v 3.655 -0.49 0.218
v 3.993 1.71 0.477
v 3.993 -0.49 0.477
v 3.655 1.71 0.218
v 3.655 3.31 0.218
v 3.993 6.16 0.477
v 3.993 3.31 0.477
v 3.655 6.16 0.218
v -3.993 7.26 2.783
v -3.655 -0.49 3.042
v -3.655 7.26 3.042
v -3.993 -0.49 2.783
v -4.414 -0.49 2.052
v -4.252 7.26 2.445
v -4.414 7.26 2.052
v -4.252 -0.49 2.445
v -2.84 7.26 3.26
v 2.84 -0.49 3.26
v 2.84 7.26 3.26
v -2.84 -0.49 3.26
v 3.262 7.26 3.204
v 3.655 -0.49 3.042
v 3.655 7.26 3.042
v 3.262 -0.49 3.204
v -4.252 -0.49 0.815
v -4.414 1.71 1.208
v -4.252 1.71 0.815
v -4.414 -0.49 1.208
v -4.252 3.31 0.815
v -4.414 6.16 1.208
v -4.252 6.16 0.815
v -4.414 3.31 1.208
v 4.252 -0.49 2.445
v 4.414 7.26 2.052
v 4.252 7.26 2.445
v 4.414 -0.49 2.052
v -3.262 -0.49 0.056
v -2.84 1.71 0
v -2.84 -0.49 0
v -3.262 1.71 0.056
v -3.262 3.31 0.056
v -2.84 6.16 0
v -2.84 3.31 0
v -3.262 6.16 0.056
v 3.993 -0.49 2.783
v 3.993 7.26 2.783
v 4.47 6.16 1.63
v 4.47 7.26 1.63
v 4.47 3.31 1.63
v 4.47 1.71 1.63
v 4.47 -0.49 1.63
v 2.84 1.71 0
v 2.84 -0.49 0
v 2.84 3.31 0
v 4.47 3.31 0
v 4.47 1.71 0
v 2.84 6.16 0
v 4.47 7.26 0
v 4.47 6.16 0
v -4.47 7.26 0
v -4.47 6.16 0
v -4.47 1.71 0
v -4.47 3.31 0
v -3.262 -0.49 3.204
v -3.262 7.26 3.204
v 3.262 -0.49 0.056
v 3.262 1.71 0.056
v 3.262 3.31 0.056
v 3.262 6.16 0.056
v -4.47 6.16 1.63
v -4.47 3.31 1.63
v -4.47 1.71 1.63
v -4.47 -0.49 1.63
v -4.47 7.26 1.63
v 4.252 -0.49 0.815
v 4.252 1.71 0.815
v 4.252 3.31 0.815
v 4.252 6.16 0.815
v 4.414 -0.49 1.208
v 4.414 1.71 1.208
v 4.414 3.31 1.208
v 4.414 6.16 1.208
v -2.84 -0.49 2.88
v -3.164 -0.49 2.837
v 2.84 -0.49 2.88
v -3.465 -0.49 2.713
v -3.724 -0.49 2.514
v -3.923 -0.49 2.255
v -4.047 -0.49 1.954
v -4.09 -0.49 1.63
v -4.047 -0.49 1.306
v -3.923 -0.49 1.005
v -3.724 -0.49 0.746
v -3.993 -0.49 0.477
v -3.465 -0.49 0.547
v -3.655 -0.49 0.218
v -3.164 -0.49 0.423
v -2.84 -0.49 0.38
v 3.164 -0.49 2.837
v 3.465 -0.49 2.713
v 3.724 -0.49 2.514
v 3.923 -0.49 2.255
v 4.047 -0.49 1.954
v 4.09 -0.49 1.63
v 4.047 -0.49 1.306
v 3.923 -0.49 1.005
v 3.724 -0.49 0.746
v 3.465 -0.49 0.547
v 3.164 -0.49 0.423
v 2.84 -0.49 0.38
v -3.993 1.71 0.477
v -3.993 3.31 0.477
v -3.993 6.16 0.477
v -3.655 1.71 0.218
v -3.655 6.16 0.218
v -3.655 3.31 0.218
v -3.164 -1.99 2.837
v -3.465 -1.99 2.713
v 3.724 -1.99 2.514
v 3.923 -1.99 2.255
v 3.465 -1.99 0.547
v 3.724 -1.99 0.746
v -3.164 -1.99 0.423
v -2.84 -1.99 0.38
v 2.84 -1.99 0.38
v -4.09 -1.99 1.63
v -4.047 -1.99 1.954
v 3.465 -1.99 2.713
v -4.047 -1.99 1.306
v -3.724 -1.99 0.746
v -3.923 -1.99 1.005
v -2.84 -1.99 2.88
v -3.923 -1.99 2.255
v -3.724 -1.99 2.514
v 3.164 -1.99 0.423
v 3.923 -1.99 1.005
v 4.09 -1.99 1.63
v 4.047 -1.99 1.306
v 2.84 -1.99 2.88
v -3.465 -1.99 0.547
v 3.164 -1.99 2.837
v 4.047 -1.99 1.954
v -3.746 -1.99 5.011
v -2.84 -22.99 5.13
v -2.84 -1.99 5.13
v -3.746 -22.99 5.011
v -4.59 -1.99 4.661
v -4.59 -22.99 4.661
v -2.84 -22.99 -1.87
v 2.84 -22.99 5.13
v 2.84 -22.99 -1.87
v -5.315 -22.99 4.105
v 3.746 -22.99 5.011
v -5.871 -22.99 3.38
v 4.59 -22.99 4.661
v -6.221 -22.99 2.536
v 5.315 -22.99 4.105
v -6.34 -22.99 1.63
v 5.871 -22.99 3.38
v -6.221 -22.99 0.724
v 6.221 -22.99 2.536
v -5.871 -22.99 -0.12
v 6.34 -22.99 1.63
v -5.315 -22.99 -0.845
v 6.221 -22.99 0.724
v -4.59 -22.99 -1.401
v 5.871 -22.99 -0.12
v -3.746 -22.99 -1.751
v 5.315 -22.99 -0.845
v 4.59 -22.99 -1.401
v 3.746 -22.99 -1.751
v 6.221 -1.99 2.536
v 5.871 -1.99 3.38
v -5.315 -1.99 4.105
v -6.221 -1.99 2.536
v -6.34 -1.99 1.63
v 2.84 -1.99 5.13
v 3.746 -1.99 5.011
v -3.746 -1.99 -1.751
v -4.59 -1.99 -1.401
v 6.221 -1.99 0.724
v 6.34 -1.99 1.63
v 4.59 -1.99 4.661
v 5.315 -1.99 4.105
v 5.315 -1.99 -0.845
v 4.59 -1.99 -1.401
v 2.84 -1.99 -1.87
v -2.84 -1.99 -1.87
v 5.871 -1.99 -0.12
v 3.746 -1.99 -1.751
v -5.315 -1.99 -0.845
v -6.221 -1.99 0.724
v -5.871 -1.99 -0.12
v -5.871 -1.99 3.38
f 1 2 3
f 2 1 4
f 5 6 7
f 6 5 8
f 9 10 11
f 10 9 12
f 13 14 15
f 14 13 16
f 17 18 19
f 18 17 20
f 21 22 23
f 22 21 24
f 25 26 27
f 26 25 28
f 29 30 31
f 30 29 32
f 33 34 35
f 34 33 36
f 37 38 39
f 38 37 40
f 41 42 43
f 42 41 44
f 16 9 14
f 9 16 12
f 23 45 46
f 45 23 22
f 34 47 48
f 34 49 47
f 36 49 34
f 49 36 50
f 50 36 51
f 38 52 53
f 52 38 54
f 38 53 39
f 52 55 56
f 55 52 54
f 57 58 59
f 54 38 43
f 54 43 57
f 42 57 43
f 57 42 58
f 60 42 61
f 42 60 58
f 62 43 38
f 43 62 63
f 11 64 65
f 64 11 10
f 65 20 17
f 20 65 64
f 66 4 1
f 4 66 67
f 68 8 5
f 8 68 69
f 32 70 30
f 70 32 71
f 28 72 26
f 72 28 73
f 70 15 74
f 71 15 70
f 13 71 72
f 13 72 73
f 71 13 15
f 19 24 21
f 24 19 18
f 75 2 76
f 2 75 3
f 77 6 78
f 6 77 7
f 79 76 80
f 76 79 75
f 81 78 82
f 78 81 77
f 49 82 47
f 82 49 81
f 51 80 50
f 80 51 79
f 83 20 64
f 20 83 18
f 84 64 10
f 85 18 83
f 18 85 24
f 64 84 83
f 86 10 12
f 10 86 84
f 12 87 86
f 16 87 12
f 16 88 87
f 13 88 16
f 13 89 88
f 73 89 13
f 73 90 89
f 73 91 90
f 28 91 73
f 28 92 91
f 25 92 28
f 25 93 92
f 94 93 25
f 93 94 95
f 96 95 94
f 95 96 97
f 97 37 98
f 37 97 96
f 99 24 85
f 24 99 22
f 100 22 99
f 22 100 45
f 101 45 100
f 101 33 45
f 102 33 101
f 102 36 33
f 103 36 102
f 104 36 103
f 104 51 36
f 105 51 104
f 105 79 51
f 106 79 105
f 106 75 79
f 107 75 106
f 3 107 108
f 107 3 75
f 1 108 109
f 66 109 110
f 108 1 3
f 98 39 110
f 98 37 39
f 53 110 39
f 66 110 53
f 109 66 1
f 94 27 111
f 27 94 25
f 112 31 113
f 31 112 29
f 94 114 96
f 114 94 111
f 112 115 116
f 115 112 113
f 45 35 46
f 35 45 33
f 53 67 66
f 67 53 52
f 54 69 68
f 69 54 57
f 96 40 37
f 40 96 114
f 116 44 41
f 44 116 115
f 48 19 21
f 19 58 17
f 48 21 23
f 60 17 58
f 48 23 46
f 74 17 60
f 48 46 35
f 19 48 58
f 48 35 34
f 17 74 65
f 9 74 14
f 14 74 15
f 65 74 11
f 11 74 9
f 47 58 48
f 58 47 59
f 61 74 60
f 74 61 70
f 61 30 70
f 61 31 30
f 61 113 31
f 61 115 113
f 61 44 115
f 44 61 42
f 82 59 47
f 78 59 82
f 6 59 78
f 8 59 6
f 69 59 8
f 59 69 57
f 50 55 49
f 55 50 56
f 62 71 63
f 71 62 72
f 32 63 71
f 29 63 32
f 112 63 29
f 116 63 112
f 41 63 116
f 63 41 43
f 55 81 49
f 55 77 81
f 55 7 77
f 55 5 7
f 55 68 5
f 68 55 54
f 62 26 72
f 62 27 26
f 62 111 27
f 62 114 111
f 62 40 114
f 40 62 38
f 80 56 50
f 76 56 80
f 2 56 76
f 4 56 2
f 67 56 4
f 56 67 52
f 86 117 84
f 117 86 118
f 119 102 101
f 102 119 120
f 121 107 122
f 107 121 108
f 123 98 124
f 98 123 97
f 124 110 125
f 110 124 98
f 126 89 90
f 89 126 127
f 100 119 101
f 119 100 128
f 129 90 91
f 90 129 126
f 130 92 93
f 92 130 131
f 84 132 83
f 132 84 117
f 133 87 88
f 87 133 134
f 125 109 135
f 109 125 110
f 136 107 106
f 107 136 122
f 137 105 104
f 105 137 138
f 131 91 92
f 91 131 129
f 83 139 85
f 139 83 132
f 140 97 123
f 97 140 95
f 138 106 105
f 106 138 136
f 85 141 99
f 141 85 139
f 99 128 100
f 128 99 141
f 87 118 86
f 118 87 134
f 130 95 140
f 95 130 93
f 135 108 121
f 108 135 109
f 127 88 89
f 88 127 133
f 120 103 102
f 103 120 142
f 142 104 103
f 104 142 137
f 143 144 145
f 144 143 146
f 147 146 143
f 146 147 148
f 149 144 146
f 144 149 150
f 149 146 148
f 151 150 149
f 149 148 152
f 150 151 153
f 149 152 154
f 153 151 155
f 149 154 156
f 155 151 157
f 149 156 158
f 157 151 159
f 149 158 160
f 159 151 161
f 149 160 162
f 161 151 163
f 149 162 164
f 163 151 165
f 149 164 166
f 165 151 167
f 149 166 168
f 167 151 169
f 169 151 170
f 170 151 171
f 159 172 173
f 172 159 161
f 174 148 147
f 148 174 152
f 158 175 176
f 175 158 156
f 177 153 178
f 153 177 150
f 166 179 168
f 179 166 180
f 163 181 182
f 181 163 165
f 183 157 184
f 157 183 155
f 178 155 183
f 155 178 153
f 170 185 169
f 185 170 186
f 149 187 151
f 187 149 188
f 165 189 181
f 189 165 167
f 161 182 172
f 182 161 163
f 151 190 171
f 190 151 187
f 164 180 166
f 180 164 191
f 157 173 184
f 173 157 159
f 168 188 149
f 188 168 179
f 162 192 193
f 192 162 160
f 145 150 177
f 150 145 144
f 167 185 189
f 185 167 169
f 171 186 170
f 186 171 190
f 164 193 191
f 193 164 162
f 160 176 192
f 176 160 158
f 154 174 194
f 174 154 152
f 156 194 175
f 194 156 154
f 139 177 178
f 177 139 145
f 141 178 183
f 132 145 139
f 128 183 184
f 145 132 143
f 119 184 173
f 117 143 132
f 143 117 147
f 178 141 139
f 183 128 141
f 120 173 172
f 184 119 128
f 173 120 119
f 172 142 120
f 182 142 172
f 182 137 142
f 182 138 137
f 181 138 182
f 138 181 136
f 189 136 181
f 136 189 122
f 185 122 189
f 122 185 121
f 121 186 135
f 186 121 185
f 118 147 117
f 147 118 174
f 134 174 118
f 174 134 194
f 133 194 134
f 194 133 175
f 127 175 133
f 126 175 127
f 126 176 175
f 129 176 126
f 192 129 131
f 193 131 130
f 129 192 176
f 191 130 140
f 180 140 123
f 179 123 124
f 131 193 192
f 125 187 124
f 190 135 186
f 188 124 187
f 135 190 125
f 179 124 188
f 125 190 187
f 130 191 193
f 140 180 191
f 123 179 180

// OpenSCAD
translate([-4.47,-0.49,0])
{
	translate([1.63,0,1.63])
	rotate([-90,0,0])
	hull()
	{
		cylinder(d=3.26,h=7.75,$fn=24);
		translate([5.68,0,0])
		cylinder(d=3.26,h=7.75,$fn=24);
	}
	translate([0,6.65,0])cube([8.94,1.1,1.63]);
	translate([0,2.2,0])cube([8.94,1.6,1.63]);
	// Plug
	translate([1.63,-20,1.63])
	rotate([-90,0,0])
	hull()
	{
		cylinder(d=2.5,h=21,$fn=24);
		translate([5.68,0,0])
		cylinder(d=2.5,h=21,$fn=24);
	}
	translate([1.63,-22.5,1.63])
	rotate([-90,0,0])
	hull()
	{
		cylinder(d=7,h=21,$fn=24);
		translate([5.68,0,0])
		cylinder(d=7,h=21,$fn=24);
	}
}
